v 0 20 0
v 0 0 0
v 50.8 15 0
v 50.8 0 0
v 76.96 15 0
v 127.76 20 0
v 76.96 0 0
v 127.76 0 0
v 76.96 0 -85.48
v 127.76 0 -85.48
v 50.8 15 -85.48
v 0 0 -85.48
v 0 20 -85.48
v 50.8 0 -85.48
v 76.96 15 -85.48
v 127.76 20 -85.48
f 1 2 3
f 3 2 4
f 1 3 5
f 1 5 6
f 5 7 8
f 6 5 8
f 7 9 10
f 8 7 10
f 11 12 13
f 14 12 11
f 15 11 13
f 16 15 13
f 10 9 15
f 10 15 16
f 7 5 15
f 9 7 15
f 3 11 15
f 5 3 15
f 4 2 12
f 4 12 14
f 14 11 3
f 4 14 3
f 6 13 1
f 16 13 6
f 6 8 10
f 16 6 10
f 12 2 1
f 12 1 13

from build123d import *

# Parameters (mm, degrees)
SKETCH1_W           = 127.76
SKETCH1_H           = 85.48
BOSS_EXTRUDE1_DEPTH = 20
CUT_EXTRUDE1_START  = -5
CUT_EXTRUDE1_DEPTH  = 20


with BuildPart() as part:
    # Sketch1 → Boss-Extrude1 (new body)
    with BuildSketch(Plane(origin=(0, 0, 0), x_dir=(1, 0, 0), z_dir=(0, 1, 0))):
        with Locations((63.88, 42.74)):
            Rectangle(SKETCH1_W, SKETCH1_H)
    extrude(amount=BOSS_EXTRUDE1_DEPTH)

    # Sketch2 → Cut-Extrude1 (cut)
    with BuildSketch(Plane(origin=(0, 20, 0), x_dir=(1, 0, 0), z_dir=(0, 1, 0)).offset(CUT_EXTRUDE1_START)):
        Polygon((76.96, 85.48), (50.8, 85.48), (50.8, 12.7), (50.8, 0), (76.96, 0), (76.96, 72.78), align=None)
    extrude(amount=-CUT_EXTRUDE1_DEPTH, mode=Mode.SUBTRACT)


solid = part.part
